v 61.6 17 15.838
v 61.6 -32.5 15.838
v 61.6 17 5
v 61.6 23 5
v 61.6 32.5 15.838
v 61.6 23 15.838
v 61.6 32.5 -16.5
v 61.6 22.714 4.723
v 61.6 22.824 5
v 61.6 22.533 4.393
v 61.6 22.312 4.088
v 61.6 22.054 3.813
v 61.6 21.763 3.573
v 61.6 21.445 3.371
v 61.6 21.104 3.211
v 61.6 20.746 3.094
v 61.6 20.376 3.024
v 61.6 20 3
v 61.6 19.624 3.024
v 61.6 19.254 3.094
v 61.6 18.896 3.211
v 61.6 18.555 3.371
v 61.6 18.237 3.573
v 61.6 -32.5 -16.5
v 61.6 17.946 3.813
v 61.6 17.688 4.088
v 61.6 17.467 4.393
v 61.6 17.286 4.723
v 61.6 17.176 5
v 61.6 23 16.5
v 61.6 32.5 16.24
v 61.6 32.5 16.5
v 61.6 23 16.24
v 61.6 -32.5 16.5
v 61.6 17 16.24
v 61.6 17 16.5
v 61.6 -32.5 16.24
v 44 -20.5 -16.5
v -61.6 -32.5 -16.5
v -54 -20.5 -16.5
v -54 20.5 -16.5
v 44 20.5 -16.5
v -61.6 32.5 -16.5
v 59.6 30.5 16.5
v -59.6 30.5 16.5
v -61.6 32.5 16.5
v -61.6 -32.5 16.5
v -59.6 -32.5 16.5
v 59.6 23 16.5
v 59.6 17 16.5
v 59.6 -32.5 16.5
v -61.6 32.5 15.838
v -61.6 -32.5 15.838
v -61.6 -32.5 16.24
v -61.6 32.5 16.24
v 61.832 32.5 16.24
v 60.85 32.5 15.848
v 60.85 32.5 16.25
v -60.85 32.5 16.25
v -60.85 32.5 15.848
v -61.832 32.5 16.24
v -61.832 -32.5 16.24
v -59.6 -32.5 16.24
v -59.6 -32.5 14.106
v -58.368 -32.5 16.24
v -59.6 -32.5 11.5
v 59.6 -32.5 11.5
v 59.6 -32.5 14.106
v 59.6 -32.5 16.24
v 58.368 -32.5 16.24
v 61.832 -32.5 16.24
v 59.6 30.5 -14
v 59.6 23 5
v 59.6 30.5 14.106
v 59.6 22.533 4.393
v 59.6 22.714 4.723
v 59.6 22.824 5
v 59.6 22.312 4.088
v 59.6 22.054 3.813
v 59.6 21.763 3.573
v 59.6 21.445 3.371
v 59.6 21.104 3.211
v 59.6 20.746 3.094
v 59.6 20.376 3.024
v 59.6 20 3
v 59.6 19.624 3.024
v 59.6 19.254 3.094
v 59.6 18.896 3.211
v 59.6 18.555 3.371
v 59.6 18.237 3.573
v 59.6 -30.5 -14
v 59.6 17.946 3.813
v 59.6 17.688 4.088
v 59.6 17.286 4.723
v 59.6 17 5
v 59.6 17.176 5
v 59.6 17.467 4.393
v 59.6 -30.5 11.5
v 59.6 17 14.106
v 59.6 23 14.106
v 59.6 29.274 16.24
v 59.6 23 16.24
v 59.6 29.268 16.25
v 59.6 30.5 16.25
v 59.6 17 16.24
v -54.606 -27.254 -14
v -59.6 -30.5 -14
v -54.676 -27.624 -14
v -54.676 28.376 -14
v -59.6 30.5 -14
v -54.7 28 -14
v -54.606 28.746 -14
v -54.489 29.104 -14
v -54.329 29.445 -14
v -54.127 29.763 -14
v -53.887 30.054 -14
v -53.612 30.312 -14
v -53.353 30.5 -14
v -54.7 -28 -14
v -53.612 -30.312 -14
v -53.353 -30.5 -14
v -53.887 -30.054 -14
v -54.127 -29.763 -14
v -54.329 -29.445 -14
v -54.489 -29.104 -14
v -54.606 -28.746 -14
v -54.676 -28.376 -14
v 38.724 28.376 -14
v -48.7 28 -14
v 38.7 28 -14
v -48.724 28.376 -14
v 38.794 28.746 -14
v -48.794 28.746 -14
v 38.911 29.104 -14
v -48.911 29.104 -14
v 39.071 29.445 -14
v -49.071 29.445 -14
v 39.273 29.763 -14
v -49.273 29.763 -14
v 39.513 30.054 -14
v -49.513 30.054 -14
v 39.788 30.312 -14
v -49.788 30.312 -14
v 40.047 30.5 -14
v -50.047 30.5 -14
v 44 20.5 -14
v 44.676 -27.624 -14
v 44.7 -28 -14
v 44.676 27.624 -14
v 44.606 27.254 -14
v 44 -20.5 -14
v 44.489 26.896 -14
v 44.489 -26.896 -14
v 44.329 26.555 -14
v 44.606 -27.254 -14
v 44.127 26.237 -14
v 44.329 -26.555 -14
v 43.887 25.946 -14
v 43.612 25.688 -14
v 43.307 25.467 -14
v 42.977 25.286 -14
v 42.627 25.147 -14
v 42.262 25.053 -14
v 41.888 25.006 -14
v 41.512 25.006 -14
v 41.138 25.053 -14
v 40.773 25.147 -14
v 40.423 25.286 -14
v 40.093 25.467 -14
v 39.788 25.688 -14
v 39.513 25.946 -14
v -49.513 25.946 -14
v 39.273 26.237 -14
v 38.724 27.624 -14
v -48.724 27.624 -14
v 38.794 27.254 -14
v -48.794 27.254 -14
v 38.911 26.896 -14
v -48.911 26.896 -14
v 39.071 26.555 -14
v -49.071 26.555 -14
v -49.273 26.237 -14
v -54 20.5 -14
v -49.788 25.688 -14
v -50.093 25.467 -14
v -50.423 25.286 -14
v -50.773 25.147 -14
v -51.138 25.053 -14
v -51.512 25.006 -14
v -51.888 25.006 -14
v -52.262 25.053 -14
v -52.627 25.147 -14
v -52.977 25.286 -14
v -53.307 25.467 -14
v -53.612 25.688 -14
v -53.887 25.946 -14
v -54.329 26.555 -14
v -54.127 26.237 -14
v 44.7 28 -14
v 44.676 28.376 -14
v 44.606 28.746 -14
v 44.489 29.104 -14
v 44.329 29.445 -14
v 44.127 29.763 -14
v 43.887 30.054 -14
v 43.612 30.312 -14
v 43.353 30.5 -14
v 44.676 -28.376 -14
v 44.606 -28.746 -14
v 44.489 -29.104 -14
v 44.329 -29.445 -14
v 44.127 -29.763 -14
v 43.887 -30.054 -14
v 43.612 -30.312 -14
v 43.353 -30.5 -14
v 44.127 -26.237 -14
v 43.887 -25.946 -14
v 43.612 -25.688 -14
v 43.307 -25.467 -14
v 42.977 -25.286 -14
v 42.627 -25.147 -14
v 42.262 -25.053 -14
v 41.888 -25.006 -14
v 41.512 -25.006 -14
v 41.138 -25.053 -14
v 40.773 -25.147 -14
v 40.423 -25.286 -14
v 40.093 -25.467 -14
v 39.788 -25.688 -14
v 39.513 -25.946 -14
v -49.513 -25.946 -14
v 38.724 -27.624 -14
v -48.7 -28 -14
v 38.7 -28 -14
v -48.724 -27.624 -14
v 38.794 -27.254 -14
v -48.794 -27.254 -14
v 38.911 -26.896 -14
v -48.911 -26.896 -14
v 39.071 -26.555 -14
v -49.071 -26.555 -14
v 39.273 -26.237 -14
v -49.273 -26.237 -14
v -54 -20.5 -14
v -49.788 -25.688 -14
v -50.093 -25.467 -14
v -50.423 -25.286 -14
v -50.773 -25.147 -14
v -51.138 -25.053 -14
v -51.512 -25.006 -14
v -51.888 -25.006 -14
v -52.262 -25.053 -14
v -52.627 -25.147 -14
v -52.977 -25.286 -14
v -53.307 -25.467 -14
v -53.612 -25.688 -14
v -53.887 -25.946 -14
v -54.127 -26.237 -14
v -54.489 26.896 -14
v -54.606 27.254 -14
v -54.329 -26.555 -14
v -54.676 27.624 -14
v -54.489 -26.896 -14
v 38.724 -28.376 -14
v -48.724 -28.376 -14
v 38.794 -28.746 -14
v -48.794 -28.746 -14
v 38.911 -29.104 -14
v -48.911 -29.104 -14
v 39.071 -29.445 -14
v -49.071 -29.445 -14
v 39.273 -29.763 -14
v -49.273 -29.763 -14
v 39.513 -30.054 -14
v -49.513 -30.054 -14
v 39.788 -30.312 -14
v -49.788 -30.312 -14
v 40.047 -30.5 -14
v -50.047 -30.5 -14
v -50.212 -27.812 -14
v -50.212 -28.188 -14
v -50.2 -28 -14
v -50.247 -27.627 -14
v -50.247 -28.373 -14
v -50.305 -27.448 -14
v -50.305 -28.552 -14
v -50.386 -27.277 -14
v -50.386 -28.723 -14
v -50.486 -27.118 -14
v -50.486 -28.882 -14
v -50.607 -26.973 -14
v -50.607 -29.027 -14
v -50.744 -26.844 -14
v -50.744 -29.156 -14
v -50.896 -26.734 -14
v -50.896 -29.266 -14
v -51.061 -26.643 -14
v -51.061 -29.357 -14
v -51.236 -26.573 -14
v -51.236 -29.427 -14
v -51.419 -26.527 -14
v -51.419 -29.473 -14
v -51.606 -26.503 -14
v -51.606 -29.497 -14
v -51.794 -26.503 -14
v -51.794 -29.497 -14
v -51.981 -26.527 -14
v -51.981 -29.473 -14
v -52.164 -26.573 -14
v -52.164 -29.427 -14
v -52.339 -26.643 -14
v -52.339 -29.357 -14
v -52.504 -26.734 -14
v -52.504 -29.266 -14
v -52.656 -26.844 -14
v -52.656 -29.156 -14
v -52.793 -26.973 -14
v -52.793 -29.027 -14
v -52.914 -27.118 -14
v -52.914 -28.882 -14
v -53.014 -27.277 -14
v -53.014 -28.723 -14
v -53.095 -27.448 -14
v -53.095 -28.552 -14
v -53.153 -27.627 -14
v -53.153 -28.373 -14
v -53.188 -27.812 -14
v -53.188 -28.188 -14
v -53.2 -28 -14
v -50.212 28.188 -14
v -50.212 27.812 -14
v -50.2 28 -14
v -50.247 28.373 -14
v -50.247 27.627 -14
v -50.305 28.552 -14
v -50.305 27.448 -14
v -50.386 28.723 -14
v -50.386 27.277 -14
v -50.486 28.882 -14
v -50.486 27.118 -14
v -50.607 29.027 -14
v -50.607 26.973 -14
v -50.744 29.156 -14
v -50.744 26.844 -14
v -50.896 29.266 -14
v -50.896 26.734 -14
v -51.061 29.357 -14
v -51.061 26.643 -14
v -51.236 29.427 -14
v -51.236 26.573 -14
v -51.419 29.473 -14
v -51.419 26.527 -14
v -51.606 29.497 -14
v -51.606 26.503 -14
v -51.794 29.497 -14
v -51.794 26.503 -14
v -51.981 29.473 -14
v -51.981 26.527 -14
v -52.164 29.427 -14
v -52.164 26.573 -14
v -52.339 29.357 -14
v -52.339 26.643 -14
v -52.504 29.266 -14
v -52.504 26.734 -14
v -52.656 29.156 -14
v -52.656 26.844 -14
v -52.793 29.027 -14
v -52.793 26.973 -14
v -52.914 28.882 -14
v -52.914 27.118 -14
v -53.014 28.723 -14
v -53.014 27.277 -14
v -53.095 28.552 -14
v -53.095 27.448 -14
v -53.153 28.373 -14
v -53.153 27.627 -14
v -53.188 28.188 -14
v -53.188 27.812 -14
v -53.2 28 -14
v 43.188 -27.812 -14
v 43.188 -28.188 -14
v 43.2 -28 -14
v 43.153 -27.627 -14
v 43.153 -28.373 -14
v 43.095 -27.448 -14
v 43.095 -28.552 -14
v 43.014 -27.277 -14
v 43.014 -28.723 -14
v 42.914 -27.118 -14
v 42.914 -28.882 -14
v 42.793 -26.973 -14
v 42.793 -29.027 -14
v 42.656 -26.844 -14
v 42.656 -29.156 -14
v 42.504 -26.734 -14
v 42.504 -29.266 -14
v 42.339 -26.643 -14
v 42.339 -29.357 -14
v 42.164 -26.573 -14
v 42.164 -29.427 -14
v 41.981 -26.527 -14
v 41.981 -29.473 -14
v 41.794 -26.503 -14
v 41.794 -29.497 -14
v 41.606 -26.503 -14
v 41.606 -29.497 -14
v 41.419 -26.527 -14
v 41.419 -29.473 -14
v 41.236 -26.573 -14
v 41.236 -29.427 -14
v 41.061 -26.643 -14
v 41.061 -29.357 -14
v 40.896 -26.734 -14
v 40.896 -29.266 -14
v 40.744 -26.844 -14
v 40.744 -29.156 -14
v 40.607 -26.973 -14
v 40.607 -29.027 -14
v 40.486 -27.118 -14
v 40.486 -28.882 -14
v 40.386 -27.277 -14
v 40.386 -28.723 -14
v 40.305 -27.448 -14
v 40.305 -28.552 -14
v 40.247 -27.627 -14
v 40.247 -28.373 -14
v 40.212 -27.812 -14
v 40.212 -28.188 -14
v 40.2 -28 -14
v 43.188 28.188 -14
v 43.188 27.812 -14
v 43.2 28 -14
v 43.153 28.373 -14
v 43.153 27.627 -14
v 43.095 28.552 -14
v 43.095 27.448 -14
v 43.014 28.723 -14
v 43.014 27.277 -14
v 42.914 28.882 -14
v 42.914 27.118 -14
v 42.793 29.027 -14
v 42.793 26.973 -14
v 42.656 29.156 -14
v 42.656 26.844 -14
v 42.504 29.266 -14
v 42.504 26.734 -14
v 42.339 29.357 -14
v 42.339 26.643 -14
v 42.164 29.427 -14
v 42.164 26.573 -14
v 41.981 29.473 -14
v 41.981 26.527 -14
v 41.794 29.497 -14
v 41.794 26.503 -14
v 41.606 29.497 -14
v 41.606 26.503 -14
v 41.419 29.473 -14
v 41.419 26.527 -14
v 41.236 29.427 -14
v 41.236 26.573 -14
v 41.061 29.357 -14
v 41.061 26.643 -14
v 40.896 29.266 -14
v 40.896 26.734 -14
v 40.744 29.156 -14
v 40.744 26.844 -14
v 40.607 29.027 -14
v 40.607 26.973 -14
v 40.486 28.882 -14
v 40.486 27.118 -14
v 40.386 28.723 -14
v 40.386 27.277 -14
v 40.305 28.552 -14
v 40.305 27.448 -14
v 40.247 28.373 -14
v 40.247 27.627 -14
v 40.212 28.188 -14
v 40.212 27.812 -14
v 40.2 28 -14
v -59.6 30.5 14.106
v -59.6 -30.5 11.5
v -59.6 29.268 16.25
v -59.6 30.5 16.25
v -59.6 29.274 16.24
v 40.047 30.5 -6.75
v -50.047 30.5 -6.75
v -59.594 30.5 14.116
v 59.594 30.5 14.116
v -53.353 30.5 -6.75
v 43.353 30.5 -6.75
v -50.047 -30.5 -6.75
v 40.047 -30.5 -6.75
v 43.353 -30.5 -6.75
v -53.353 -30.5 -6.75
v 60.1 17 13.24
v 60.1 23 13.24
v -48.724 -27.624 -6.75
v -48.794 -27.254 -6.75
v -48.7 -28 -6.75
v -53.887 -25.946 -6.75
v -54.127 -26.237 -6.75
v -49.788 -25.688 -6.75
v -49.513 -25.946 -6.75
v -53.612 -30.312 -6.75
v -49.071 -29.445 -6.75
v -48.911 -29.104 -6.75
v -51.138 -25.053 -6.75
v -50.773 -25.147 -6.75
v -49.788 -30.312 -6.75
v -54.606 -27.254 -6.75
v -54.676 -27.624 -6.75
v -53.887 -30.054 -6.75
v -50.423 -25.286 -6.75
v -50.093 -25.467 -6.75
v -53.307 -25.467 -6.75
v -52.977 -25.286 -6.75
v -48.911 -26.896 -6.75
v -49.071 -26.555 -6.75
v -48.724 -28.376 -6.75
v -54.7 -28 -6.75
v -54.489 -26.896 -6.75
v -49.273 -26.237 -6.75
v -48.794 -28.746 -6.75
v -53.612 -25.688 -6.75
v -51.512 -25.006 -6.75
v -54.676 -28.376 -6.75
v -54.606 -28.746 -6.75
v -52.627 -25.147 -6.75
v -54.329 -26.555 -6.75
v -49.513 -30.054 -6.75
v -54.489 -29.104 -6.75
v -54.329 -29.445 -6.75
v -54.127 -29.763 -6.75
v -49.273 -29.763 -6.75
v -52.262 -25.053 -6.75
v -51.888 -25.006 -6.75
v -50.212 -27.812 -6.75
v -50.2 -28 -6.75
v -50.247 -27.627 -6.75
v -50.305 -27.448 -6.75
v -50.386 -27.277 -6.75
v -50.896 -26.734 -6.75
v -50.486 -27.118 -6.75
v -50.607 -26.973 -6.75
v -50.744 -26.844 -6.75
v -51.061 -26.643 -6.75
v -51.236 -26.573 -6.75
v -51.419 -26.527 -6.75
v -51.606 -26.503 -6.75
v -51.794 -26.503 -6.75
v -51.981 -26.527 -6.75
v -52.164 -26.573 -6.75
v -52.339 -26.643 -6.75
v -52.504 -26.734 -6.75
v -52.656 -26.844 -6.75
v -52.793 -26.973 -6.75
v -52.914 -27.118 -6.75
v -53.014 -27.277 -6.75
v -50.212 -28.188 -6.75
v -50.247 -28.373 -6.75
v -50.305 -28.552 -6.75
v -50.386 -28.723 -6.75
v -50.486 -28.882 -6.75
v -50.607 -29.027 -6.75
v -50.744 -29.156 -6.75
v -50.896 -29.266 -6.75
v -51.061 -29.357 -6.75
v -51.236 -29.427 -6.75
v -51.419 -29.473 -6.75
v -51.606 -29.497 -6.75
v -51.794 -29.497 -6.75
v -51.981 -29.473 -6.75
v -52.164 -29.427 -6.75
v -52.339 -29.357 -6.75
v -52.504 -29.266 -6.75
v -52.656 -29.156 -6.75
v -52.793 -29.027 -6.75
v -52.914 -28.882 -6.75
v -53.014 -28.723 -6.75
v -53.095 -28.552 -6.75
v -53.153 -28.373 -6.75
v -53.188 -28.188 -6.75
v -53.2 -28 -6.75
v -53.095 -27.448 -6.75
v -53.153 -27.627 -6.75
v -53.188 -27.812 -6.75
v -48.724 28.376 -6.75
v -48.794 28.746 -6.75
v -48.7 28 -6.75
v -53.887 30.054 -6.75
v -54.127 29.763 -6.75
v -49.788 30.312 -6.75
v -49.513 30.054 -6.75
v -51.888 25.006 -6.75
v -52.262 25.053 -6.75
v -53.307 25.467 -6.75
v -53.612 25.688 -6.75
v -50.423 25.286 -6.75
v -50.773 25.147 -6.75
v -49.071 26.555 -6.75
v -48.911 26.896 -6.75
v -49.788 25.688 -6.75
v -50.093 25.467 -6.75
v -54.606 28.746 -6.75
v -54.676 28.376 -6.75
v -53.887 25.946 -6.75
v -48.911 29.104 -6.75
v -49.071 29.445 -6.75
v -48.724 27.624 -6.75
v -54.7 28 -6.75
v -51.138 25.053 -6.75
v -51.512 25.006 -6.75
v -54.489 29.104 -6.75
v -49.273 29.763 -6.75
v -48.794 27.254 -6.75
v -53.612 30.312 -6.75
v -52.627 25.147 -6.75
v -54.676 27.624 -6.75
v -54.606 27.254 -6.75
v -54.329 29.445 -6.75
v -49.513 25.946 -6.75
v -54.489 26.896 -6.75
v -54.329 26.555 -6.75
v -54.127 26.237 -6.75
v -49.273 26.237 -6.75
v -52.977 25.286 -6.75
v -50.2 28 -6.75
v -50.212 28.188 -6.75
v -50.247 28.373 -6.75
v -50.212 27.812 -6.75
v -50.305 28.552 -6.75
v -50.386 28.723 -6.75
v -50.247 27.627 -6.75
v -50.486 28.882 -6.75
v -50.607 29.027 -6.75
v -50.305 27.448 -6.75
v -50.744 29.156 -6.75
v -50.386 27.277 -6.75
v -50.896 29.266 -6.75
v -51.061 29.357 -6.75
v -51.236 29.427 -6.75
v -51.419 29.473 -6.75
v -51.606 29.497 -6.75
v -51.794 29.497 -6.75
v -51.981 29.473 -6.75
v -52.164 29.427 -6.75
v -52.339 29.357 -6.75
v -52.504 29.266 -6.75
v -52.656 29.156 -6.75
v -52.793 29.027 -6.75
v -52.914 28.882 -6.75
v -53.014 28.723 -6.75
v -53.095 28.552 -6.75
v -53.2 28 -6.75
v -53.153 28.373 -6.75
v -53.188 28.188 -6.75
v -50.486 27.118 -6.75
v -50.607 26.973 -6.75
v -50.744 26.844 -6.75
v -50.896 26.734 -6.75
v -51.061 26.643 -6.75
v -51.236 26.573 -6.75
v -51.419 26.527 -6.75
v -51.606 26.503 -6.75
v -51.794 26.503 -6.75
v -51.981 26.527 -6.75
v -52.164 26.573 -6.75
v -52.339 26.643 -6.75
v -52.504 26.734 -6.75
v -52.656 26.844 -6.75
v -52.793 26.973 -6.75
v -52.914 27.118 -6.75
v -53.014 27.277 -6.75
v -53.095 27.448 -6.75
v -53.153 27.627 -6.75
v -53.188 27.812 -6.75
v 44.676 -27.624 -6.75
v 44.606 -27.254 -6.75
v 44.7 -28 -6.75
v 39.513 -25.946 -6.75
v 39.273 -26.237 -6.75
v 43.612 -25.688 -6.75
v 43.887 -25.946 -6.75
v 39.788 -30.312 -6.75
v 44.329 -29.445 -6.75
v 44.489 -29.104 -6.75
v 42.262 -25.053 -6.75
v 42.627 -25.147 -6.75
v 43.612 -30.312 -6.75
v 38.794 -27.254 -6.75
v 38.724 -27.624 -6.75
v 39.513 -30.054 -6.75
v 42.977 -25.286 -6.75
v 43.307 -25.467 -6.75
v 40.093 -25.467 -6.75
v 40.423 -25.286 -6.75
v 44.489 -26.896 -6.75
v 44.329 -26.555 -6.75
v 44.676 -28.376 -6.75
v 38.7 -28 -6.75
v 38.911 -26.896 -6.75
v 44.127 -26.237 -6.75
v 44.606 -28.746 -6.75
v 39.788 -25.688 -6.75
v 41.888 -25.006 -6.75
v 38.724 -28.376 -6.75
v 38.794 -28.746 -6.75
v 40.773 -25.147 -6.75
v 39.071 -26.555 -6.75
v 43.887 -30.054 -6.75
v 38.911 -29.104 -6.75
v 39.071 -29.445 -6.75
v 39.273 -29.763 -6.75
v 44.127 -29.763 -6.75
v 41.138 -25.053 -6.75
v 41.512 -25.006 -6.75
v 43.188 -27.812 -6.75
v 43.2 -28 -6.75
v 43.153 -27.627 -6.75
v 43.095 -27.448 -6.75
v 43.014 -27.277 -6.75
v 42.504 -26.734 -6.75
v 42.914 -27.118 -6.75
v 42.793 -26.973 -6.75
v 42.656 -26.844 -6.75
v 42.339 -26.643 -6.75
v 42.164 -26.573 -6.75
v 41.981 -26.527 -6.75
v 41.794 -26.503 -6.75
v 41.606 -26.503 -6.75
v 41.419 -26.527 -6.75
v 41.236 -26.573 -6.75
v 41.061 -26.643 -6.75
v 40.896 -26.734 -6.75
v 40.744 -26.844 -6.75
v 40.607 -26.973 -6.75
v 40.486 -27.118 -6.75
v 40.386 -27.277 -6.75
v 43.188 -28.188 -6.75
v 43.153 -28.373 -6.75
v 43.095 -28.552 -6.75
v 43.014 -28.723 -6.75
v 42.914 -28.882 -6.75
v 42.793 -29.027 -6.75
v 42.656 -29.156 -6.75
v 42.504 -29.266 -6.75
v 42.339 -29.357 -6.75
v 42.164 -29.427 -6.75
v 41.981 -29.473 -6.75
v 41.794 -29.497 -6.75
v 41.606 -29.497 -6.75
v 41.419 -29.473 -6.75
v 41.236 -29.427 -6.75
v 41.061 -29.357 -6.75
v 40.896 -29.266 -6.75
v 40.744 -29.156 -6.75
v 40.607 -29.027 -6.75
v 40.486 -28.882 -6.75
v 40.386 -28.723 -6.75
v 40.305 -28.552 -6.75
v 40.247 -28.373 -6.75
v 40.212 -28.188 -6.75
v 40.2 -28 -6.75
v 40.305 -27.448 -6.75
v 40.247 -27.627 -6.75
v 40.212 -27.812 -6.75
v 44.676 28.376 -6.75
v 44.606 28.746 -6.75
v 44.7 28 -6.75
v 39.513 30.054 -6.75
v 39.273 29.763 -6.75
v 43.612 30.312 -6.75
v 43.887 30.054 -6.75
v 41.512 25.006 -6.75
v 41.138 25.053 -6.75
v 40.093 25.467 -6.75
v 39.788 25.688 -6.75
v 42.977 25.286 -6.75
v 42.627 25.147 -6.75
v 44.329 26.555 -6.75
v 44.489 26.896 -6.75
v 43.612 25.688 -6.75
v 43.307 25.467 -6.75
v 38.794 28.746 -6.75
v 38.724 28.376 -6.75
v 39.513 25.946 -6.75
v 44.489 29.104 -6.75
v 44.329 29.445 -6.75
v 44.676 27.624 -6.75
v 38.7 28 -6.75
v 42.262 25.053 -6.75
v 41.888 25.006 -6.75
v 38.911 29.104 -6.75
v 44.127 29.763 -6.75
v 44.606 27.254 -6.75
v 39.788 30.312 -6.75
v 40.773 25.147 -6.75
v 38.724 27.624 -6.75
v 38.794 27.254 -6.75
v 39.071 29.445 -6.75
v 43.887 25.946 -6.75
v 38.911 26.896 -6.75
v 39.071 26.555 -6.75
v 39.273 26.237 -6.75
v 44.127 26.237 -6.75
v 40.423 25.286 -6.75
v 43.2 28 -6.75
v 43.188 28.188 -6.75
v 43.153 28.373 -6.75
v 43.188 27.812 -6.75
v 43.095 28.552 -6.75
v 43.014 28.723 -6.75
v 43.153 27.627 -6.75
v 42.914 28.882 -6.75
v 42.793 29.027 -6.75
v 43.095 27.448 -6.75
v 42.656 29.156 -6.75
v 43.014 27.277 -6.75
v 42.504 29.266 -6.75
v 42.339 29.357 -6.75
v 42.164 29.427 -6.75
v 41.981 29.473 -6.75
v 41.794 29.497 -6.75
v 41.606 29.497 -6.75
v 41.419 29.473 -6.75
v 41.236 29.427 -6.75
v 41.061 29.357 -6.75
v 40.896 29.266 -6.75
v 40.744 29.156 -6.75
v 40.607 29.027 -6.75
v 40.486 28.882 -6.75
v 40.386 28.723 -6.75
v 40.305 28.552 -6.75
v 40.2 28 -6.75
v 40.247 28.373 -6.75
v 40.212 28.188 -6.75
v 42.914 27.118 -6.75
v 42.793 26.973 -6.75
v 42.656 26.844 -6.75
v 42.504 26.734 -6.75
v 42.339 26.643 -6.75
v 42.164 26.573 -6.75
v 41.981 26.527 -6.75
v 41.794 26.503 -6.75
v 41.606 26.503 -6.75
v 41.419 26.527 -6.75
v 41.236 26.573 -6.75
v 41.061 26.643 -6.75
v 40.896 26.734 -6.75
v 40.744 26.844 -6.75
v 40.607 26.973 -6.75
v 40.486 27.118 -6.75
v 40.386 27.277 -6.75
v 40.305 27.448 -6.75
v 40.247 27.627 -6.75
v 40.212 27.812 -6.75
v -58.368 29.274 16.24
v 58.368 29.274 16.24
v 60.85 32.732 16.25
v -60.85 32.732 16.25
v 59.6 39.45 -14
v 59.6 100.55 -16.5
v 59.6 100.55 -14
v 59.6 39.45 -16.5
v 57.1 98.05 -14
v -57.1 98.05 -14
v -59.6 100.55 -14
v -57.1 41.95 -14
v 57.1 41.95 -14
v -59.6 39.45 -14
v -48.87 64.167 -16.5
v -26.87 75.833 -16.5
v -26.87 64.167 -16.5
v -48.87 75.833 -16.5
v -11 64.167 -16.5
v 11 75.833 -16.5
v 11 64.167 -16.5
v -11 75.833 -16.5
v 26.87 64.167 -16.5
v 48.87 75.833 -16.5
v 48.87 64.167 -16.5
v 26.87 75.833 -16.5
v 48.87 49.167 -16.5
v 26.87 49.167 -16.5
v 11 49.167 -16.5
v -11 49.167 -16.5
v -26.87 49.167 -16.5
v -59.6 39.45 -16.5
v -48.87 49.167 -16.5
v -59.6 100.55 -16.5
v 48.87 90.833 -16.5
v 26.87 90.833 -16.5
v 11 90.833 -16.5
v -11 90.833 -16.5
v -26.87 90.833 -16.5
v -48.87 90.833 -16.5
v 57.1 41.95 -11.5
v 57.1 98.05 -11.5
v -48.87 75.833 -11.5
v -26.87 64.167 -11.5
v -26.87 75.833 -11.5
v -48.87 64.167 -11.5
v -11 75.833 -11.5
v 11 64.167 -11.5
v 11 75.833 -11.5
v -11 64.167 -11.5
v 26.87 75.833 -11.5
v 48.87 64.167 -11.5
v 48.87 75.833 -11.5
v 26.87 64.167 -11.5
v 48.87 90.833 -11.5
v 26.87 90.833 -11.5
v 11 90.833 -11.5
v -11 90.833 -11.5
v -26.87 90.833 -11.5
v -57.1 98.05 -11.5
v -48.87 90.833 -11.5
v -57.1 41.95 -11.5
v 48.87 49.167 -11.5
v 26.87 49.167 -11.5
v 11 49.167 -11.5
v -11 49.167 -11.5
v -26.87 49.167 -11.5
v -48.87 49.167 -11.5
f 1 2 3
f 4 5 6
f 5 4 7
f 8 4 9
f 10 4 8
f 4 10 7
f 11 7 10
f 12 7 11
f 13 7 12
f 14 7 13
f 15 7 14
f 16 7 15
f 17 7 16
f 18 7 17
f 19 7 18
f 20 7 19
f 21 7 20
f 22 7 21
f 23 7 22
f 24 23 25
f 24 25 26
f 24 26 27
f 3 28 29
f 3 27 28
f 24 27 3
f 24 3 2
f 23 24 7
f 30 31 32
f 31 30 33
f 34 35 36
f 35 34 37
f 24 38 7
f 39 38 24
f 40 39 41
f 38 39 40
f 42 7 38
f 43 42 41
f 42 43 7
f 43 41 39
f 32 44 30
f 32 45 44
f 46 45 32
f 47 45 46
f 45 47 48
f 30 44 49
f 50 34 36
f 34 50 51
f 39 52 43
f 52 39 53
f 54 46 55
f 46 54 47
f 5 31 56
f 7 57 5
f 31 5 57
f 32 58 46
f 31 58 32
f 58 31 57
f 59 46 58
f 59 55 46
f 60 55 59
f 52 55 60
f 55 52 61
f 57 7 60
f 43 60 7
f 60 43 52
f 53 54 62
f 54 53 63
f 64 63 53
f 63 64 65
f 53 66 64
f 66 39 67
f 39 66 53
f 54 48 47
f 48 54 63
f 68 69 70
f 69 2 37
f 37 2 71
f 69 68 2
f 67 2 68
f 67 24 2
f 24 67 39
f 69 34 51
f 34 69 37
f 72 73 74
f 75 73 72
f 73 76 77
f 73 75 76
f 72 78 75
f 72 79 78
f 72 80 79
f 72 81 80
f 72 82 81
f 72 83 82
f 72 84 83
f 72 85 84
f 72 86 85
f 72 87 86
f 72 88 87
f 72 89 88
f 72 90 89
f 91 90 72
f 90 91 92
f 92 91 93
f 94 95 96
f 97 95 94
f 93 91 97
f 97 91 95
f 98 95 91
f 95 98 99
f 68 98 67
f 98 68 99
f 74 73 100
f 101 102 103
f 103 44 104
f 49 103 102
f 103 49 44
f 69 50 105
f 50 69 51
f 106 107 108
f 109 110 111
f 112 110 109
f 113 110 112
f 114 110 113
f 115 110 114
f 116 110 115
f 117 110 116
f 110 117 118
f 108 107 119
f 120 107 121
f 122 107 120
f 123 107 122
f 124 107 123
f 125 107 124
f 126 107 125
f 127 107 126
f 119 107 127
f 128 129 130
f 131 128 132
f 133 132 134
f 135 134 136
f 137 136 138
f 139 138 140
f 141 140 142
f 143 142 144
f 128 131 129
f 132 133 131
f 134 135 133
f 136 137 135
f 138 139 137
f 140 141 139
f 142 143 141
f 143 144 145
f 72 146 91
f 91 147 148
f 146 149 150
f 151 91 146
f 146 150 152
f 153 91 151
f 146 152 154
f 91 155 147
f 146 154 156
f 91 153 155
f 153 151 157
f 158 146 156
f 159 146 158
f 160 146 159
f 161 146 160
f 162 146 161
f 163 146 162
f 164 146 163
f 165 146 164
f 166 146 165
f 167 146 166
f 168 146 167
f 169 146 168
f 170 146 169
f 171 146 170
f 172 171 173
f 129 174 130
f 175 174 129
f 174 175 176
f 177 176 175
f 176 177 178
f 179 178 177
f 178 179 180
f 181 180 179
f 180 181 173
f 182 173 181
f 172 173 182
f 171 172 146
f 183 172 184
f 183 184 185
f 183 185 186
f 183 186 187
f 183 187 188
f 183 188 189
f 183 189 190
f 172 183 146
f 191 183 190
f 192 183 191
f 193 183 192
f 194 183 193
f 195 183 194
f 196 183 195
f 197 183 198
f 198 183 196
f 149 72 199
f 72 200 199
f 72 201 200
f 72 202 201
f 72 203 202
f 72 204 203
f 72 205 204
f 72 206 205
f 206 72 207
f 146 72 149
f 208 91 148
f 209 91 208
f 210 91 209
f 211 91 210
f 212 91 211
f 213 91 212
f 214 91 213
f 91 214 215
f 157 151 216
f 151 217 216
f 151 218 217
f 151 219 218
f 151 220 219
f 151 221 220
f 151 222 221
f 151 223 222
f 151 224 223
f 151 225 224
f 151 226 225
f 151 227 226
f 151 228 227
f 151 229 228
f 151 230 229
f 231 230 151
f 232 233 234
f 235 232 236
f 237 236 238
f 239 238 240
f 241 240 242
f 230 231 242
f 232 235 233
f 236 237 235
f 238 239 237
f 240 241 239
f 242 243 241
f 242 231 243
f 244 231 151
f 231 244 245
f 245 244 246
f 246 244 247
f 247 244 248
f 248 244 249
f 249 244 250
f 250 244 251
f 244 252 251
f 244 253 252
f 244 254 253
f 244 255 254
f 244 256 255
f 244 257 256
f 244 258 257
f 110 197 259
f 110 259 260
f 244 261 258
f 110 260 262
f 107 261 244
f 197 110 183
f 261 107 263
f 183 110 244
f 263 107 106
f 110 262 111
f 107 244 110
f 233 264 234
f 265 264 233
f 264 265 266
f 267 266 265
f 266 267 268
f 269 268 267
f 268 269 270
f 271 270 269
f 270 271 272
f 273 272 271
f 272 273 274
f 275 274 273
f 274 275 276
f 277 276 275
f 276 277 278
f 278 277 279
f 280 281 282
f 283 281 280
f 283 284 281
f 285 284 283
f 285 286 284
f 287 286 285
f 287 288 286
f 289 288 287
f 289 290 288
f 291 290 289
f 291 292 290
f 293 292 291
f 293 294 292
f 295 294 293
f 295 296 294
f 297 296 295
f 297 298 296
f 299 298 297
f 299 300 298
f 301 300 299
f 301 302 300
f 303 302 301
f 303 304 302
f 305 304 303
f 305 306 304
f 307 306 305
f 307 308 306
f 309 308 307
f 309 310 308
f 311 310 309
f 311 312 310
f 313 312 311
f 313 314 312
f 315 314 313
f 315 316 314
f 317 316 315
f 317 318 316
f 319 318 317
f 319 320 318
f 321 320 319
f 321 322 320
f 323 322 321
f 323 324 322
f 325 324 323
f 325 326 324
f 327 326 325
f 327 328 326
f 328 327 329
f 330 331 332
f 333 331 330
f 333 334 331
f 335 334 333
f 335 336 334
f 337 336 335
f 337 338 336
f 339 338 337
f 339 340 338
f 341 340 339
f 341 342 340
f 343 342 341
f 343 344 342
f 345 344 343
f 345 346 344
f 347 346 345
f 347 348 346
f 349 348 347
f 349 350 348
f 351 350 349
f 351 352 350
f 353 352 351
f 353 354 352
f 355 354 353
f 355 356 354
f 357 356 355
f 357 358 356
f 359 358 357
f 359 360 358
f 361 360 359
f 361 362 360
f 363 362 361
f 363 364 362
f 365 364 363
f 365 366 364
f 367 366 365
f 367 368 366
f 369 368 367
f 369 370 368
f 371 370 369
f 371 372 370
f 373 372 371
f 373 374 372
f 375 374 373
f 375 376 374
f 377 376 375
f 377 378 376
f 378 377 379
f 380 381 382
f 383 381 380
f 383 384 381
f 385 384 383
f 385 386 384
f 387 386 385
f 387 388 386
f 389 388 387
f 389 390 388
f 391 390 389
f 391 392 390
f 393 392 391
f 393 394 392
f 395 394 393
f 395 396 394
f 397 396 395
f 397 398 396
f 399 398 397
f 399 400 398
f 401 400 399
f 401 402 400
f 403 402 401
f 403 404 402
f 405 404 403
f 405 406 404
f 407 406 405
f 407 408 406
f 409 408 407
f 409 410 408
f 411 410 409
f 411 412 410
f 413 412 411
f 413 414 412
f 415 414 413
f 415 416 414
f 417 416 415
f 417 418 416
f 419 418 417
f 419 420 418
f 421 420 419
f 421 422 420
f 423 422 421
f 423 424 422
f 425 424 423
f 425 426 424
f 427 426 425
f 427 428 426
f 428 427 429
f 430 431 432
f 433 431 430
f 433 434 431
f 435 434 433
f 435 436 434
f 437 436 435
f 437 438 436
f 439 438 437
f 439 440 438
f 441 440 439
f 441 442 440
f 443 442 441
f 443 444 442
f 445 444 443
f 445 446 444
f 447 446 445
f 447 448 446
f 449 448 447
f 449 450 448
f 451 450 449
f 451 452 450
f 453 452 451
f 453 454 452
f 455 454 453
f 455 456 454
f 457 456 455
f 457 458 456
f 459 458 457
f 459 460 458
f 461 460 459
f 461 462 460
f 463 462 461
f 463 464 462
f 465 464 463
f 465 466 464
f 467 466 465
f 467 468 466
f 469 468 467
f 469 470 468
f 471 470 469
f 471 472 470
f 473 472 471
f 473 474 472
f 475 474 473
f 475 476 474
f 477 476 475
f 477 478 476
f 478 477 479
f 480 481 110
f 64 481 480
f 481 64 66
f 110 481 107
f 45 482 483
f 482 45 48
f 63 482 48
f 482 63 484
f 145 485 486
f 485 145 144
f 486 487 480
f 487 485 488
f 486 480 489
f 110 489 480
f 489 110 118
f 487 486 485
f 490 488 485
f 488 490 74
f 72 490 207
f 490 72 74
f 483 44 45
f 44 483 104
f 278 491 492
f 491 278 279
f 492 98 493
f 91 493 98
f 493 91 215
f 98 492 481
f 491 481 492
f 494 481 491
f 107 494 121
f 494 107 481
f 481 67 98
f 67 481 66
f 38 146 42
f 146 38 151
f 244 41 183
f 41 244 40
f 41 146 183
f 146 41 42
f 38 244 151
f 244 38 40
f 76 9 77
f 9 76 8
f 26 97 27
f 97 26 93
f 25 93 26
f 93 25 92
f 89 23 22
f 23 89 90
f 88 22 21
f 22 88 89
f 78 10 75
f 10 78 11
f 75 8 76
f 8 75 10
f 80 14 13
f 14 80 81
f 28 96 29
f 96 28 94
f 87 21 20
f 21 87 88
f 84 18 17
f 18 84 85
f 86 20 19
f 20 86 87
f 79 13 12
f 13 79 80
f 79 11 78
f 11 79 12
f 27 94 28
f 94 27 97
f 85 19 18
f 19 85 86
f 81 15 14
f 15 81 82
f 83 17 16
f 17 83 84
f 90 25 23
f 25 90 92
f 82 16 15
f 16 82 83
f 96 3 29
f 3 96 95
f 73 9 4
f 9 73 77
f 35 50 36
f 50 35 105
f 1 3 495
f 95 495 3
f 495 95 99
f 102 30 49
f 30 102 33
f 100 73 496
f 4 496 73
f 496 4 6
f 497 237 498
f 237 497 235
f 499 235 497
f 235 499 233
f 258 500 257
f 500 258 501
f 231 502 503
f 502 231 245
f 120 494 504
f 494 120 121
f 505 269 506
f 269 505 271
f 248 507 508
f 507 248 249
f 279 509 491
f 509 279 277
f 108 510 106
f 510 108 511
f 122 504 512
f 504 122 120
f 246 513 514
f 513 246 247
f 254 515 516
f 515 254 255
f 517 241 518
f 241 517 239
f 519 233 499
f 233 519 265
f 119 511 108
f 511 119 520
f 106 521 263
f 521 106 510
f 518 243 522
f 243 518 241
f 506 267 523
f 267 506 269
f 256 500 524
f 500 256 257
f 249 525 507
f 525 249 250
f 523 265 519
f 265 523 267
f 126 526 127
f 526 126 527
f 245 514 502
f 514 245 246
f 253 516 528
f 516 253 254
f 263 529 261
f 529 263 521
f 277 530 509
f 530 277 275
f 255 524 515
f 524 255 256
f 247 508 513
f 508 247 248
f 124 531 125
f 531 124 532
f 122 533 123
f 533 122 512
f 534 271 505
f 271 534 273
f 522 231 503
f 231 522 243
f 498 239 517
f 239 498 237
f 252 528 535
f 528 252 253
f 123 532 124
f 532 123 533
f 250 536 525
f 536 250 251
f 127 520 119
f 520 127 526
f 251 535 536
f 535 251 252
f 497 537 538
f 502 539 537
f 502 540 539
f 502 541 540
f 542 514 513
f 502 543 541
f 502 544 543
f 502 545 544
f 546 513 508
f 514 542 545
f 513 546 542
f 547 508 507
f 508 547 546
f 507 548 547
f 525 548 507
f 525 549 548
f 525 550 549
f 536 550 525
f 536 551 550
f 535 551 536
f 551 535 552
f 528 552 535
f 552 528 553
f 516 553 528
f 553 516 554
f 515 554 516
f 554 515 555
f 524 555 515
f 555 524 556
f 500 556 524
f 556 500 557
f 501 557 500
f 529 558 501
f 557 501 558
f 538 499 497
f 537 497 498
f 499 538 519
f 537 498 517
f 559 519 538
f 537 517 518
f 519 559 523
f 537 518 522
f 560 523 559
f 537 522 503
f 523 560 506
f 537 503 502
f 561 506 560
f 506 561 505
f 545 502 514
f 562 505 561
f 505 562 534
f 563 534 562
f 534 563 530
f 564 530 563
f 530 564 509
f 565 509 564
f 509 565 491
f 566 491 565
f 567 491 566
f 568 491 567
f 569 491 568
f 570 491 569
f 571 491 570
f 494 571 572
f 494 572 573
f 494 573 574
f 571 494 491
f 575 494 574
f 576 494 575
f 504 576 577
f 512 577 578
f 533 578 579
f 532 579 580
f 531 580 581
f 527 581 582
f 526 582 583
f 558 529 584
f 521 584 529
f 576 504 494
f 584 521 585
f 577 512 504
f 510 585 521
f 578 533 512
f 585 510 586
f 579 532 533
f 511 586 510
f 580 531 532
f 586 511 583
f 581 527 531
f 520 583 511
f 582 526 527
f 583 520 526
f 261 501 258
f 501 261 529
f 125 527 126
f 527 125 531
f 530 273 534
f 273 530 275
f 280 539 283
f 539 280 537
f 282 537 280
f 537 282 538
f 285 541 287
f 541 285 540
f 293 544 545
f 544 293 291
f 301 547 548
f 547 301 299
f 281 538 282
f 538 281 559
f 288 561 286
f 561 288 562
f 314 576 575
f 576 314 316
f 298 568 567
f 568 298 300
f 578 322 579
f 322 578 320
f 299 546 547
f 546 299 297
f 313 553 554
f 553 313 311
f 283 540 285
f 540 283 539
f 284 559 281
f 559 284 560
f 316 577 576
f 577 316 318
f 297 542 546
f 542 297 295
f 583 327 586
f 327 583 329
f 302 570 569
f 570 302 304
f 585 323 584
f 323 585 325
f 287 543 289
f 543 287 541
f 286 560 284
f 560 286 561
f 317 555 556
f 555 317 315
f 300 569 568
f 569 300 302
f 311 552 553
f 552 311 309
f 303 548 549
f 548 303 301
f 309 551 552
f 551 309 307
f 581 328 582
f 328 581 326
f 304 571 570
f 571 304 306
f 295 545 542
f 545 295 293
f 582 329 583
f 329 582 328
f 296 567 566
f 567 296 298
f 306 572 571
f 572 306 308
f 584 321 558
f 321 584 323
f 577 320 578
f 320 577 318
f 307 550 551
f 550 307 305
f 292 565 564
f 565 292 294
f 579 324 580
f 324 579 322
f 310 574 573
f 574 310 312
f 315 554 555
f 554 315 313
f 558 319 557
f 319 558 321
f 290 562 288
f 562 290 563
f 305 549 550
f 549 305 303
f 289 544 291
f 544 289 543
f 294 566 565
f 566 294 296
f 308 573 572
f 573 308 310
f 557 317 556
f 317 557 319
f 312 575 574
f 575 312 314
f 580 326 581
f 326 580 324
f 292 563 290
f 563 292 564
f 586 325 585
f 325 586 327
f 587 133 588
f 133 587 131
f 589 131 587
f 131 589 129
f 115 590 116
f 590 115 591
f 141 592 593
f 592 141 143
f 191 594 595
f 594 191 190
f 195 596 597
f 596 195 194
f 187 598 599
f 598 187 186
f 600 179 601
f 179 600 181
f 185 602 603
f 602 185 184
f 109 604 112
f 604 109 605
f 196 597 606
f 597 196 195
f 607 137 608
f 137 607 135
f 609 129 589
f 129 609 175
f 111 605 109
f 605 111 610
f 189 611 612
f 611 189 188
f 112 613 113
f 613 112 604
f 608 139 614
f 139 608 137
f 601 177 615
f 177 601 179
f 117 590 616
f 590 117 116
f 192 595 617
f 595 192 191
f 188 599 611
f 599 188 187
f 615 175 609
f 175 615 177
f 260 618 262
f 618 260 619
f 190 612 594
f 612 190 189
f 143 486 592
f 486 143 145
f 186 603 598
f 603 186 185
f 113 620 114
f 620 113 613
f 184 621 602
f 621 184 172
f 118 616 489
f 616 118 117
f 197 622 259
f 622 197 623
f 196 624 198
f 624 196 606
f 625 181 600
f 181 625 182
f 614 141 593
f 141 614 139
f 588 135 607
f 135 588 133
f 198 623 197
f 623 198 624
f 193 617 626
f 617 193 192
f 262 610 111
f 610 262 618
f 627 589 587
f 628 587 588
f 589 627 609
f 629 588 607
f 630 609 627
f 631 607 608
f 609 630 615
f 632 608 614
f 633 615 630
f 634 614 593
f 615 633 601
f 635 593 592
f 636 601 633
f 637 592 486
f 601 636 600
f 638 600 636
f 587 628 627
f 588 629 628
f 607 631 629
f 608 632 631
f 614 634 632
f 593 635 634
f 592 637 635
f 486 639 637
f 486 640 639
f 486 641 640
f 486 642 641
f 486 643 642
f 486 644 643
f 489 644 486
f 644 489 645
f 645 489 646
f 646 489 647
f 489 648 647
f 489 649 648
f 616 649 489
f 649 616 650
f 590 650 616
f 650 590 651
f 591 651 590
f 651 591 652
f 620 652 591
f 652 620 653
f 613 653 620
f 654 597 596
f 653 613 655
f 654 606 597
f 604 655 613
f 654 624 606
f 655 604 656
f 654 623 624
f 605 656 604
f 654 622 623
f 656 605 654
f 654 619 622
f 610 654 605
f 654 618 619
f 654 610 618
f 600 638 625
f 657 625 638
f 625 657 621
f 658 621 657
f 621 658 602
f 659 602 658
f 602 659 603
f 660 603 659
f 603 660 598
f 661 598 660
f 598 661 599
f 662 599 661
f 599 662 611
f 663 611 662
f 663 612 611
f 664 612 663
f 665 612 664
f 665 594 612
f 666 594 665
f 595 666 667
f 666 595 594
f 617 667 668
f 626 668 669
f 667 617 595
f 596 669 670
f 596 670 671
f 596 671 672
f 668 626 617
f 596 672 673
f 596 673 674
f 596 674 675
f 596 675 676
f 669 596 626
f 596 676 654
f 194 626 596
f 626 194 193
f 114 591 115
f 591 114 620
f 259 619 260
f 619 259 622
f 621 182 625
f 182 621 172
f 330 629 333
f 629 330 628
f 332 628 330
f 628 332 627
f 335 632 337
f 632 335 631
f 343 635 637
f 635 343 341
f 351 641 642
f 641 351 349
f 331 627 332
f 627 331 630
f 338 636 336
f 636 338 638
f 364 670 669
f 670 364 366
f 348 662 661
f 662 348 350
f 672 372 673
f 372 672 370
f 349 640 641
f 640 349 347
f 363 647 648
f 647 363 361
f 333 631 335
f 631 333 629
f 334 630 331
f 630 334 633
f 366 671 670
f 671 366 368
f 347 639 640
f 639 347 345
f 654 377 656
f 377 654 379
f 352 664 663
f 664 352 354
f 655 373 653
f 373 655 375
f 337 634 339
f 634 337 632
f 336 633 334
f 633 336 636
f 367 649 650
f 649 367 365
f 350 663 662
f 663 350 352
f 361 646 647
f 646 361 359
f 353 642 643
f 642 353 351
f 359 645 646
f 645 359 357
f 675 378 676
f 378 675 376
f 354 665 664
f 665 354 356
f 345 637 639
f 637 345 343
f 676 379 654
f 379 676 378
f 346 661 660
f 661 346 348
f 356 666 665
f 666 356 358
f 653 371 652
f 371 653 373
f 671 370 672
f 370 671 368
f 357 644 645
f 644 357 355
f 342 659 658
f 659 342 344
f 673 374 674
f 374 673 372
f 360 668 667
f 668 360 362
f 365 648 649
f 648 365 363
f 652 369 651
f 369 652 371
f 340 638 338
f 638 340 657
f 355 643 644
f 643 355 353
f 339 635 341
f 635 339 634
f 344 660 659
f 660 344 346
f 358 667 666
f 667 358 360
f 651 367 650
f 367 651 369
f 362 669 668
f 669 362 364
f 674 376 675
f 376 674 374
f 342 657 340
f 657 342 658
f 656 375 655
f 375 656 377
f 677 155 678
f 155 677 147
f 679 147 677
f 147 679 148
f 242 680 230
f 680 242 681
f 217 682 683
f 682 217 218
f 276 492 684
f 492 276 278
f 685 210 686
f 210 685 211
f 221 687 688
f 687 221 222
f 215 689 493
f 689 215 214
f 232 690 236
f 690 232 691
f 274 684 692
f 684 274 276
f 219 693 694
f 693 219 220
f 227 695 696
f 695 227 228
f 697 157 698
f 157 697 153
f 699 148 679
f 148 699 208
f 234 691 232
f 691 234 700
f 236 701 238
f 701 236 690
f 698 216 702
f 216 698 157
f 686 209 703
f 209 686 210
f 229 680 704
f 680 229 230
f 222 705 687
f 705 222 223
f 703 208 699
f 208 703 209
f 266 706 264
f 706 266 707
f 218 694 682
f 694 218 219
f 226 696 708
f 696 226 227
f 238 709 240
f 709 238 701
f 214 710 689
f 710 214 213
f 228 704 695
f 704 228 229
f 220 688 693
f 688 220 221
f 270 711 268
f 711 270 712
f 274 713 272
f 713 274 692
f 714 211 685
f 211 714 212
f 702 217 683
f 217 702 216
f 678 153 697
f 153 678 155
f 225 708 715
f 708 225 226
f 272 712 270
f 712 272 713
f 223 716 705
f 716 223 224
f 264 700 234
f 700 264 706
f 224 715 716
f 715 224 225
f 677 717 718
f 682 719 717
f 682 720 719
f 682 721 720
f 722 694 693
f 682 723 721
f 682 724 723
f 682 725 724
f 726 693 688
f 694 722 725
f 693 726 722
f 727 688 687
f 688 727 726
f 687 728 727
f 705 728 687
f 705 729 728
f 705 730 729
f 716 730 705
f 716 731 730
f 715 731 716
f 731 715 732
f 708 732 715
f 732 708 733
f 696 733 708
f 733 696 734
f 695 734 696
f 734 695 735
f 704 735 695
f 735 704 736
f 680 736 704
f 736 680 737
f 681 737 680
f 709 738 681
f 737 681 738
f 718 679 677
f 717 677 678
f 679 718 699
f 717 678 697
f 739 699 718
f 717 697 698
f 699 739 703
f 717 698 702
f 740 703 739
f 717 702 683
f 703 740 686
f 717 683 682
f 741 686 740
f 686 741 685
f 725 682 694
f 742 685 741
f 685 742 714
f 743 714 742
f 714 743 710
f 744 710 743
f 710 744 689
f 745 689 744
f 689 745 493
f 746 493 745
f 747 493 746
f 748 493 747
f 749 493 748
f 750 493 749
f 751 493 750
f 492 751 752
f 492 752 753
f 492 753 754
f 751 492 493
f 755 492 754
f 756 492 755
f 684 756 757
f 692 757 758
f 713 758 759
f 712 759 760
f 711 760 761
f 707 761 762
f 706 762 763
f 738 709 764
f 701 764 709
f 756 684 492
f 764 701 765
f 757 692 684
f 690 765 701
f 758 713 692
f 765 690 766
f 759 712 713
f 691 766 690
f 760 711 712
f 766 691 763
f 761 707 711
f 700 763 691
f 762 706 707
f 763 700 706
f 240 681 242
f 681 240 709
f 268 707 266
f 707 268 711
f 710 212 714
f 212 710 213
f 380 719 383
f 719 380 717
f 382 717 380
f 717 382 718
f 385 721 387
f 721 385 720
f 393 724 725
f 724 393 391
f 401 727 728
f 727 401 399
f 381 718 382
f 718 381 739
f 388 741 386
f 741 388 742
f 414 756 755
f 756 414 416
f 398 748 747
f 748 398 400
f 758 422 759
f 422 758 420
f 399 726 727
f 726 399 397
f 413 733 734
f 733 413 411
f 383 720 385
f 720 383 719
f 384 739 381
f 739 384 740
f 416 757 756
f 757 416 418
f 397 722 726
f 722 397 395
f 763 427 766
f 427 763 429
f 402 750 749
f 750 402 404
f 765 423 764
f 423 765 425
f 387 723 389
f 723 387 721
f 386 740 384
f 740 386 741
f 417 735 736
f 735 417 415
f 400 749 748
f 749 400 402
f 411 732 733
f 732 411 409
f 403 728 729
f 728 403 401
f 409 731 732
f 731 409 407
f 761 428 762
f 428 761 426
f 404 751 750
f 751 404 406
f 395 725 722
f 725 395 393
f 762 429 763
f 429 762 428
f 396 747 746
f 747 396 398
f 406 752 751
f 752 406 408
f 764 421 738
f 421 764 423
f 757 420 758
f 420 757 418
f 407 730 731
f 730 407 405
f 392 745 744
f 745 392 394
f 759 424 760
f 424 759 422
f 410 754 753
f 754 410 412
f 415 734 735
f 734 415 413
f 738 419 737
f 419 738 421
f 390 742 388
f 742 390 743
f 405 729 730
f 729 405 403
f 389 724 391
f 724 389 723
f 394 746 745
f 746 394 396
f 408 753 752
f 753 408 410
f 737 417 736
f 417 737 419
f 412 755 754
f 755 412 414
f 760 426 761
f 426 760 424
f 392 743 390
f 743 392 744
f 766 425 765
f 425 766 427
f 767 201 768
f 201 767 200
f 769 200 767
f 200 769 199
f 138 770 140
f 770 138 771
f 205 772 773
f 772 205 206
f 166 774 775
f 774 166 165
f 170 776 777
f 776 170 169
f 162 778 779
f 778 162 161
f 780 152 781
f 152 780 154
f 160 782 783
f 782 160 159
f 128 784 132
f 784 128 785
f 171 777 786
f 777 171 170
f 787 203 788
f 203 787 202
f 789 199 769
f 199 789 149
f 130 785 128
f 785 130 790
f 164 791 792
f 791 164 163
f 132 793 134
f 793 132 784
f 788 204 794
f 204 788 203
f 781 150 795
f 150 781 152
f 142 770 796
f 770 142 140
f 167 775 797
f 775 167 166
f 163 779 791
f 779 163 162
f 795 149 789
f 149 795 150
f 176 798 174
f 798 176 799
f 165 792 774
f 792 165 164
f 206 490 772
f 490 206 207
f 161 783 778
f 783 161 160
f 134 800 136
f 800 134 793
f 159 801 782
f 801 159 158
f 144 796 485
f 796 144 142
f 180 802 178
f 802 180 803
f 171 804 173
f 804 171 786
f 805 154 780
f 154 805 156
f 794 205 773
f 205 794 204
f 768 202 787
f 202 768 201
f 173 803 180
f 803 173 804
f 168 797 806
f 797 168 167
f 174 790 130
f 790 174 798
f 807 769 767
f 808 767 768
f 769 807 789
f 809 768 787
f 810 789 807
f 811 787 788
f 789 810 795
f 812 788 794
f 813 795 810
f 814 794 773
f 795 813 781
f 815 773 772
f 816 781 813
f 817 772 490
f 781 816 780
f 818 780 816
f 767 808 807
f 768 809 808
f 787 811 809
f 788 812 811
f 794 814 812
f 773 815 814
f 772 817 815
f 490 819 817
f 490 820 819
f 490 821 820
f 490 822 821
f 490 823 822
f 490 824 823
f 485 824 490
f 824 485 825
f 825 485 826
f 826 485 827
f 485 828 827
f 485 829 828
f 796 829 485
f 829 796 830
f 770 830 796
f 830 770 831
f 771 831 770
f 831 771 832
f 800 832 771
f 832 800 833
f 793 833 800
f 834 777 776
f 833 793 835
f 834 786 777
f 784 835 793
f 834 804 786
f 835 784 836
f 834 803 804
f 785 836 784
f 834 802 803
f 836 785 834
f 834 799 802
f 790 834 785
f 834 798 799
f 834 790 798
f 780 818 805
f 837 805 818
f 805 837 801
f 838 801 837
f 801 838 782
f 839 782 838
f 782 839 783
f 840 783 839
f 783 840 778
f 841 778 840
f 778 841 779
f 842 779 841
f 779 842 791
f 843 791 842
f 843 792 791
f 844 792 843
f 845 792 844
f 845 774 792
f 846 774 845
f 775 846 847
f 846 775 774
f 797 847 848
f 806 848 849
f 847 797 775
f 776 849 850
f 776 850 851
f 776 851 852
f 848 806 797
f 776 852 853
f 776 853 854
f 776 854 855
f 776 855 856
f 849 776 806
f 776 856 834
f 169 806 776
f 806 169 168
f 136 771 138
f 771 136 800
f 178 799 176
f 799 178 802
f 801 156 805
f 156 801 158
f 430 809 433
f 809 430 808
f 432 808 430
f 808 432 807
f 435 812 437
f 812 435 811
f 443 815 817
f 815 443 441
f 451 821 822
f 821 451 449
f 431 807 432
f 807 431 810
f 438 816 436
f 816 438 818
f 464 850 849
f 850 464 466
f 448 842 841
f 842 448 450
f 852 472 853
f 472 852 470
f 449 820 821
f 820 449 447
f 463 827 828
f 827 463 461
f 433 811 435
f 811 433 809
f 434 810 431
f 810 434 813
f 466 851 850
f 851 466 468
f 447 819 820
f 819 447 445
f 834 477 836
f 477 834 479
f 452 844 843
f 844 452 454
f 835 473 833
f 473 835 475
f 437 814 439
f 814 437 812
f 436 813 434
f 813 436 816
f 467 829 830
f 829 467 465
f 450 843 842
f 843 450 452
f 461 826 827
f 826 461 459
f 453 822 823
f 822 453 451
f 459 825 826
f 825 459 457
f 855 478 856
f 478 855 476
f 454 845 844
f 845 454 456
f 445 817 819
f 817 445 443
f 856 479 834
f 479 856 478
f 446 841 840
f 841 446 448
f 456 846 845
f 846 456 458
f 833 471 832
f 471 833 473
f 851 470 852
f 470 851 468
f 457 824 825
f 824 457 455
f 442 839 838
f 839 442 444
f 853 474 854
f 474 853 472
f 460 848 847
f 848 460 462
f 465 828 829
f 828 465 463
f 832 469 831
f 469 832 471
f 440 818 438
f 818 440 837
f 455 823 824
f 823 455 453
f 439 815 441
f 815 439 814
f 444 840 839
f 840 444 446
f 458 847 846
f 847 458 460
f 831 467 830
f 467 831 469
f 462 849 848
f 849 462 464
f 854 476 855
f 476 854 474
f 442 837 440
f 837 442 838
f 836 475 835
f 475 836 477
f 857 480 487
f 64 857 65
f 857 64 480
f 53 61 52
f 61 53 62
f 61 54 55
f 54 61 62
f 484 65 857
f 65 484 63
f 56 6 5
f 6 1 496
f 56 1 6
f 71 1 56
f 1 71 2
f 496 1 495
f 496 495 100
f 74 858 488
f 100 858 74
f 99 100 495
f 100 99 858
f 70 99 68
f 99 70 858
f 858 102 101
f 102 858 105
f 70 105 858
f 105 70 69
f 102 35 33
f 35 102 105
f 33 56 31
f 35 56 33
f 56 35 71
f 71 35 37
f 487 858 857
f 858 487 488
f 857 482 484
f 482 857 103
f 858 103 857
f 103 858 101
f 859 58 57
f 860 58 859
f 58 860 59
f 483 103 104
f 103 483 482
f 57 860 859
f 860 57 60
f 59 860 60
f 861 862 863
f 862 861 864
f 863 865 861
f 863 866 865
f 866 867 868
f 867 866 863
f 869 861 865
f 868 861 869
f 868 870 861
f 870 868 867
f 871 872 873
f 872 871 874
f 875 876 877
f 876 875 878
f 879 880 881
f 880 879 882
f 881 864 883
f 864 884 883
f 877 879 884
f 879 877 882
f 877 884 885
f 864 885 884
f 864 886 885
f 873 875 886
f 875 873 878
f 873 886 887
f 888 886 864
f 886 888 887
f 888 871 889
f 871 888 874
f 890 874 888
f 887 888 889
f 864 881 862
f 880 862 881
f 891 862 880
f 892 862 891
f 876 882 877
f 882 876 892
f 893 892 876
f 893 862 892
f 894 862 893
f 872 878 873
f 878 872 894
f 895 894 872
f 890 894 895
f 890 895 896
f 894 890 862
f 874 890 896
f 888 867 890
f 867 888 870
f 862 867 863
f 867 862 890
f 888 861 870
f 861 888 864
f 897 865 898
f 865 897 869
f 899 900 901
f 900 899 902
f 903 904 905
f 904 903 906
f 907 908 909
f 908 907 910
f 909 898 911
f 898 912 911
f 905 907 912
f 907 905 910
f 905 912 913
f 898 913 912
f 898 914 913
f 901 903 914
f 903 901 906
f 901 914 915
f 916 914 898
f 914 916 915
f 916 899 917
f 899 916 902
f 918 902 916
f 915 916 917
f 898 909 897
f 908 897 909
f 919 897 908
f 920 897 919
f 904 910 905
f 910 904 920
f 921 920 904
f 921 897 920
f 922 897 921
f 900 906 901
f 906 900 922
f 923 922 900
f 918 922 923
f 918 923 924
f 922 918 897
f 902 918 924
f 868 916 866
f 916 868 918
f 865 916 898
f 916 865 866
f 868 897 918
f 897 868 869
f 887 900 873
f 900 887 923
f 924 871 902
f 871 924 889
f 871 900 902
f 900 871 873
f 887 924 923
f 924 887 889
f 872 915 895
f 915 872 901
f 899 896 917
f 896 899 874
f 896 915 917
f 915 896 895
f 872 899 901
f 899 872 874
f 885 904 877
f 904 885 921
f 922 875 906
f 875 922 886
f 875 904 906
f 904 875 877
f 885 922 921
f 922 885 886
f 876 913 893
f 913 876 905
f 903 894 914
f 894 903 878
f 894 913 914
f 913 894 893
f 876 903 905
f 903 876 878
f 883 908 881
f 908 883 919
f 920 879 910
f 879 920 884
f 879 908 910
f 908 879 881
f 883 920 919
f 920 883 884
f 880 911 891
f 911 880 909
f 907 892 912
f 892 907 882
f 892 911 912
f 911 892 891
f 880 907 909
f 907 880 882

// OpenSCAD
th=2.5;
c=.5;

lcdW=97;
lcdH=40;
// add extra height to accommodate the cover
lcdD=23+2*th;

cbH=60;
cbW=108.2;

cpW=10;

standoff=7.25;

w = cbW/2+cpW/2+th/2;
l_mount = 15;
h_mount = 4;
w_mount= 20;
// For making rounded corners
module fillet(r, h) {
    translate([r / 2, r / 2, 0])
        difference() {
            cube([r + 0.01, r + 0.01, h], center = true);
            translate([r/2, r/2, 0])
                cylinder(r = r, h = h + 1,$fn = 50, center = true);
        }
}


module front(){
	difference(){
		cube([cbW+cpW+th*2, cbH+th*2, lcdD+th*2], center=true);
		//body cutout
		translate([0,0,-th])cube([cbW+cpW+c*2, cbH+c*2, lcdD+th*2], center=true);
		//slot
		translate([0,-2,-lcdD])cube([cbW+cpW+c*2, cbH+c*2+0.1, lcdD+th*2], center=true);
		//lcd cutout
		translate([-cpW/2,0,0])
		cube([lcdW+c*2, lcdH+c*2, lcdD*2], center=true);
        //wire cutout
        translate([cbW/2+cpW/2+th/2, 20, -lcdD/2+2*th+3])
        rotate([0,90,0]) cylinder(r=3.0, h=th*3, center=true, $fn=50);
        translate([cbW/2+cpW/2+th/2, 20, -lcdD/2])
        rotate([0,180,0]) cube([th*3, 6, lcdD-10], center=true);

	}

    //wall mount
    /*
    union(){
        translate([w,w_mount/2,lcdD/2+th]) rotate([180,0,0])  cube([l_mount,w_mount,h_mount]);
        // add rounded corner
        translate([w+th/2,0,lcdD/2-h_mount/2+th/2]) rotate([90,90,0])
        fillet(2*th,w_mount+0.1);
    }
    */
    //standoff
	translate([-cpW/2,0,lcdD/2-standoff/2]){
		for (s=[-1,1])
			for (t=[-1,1])translate([s*(7.9+lcdW*0.4),t*(4+lcdH*0.6),0])difference(){
				cylinder(r=3.0, h=standoff, center=true, $fn=50);
				cylinder(r=1.5, h=standoff+1, center=true, $fn=50);
			}
	}
	//flange
	translate([0,cbH/2+1,-lcdD/2-th/2])rotate([180,0,0])rotate([0,90,0])cylinder(r=2,h=cbW+cpW+th+c*2,$fn=3,center=true);
	for(s=[-1,1]){
		translate([s*(cbW+cpW+2)/2,0,-lcdD/2-th/2+0.01])rotate([0,-90,0])rotate([90,0,0])cylinder(r=2,h=cbH+2*th,$fn=3,center=true);
	}
}

module cover(){
	difference(){
		union(){
			//flange
			cube([cbW+cpW+c*2, cbH+c*2+0.1, th], center=true);

			//base
			translate([0,0,th])cube([cbW+cpW+c*2-th*2, cbH+c*2+0.1-th*2, th], center=true);
		}
		for (s=[-1,0,1])for(t=[-1,1])
			translate([s*cbW*.35,t*cbH/4.5,0])cube([22,15,10],center=true);
		//translate([0,0,-th*0.0])cube([cbW+cpW+c*2-th*2-6, cbH+c*2-th*2-6, th*1.01], center=true);
	}
}

mirror([0,0,1])front();
translate([0,cbH+10,-(lcdD+th)/2])cover();
